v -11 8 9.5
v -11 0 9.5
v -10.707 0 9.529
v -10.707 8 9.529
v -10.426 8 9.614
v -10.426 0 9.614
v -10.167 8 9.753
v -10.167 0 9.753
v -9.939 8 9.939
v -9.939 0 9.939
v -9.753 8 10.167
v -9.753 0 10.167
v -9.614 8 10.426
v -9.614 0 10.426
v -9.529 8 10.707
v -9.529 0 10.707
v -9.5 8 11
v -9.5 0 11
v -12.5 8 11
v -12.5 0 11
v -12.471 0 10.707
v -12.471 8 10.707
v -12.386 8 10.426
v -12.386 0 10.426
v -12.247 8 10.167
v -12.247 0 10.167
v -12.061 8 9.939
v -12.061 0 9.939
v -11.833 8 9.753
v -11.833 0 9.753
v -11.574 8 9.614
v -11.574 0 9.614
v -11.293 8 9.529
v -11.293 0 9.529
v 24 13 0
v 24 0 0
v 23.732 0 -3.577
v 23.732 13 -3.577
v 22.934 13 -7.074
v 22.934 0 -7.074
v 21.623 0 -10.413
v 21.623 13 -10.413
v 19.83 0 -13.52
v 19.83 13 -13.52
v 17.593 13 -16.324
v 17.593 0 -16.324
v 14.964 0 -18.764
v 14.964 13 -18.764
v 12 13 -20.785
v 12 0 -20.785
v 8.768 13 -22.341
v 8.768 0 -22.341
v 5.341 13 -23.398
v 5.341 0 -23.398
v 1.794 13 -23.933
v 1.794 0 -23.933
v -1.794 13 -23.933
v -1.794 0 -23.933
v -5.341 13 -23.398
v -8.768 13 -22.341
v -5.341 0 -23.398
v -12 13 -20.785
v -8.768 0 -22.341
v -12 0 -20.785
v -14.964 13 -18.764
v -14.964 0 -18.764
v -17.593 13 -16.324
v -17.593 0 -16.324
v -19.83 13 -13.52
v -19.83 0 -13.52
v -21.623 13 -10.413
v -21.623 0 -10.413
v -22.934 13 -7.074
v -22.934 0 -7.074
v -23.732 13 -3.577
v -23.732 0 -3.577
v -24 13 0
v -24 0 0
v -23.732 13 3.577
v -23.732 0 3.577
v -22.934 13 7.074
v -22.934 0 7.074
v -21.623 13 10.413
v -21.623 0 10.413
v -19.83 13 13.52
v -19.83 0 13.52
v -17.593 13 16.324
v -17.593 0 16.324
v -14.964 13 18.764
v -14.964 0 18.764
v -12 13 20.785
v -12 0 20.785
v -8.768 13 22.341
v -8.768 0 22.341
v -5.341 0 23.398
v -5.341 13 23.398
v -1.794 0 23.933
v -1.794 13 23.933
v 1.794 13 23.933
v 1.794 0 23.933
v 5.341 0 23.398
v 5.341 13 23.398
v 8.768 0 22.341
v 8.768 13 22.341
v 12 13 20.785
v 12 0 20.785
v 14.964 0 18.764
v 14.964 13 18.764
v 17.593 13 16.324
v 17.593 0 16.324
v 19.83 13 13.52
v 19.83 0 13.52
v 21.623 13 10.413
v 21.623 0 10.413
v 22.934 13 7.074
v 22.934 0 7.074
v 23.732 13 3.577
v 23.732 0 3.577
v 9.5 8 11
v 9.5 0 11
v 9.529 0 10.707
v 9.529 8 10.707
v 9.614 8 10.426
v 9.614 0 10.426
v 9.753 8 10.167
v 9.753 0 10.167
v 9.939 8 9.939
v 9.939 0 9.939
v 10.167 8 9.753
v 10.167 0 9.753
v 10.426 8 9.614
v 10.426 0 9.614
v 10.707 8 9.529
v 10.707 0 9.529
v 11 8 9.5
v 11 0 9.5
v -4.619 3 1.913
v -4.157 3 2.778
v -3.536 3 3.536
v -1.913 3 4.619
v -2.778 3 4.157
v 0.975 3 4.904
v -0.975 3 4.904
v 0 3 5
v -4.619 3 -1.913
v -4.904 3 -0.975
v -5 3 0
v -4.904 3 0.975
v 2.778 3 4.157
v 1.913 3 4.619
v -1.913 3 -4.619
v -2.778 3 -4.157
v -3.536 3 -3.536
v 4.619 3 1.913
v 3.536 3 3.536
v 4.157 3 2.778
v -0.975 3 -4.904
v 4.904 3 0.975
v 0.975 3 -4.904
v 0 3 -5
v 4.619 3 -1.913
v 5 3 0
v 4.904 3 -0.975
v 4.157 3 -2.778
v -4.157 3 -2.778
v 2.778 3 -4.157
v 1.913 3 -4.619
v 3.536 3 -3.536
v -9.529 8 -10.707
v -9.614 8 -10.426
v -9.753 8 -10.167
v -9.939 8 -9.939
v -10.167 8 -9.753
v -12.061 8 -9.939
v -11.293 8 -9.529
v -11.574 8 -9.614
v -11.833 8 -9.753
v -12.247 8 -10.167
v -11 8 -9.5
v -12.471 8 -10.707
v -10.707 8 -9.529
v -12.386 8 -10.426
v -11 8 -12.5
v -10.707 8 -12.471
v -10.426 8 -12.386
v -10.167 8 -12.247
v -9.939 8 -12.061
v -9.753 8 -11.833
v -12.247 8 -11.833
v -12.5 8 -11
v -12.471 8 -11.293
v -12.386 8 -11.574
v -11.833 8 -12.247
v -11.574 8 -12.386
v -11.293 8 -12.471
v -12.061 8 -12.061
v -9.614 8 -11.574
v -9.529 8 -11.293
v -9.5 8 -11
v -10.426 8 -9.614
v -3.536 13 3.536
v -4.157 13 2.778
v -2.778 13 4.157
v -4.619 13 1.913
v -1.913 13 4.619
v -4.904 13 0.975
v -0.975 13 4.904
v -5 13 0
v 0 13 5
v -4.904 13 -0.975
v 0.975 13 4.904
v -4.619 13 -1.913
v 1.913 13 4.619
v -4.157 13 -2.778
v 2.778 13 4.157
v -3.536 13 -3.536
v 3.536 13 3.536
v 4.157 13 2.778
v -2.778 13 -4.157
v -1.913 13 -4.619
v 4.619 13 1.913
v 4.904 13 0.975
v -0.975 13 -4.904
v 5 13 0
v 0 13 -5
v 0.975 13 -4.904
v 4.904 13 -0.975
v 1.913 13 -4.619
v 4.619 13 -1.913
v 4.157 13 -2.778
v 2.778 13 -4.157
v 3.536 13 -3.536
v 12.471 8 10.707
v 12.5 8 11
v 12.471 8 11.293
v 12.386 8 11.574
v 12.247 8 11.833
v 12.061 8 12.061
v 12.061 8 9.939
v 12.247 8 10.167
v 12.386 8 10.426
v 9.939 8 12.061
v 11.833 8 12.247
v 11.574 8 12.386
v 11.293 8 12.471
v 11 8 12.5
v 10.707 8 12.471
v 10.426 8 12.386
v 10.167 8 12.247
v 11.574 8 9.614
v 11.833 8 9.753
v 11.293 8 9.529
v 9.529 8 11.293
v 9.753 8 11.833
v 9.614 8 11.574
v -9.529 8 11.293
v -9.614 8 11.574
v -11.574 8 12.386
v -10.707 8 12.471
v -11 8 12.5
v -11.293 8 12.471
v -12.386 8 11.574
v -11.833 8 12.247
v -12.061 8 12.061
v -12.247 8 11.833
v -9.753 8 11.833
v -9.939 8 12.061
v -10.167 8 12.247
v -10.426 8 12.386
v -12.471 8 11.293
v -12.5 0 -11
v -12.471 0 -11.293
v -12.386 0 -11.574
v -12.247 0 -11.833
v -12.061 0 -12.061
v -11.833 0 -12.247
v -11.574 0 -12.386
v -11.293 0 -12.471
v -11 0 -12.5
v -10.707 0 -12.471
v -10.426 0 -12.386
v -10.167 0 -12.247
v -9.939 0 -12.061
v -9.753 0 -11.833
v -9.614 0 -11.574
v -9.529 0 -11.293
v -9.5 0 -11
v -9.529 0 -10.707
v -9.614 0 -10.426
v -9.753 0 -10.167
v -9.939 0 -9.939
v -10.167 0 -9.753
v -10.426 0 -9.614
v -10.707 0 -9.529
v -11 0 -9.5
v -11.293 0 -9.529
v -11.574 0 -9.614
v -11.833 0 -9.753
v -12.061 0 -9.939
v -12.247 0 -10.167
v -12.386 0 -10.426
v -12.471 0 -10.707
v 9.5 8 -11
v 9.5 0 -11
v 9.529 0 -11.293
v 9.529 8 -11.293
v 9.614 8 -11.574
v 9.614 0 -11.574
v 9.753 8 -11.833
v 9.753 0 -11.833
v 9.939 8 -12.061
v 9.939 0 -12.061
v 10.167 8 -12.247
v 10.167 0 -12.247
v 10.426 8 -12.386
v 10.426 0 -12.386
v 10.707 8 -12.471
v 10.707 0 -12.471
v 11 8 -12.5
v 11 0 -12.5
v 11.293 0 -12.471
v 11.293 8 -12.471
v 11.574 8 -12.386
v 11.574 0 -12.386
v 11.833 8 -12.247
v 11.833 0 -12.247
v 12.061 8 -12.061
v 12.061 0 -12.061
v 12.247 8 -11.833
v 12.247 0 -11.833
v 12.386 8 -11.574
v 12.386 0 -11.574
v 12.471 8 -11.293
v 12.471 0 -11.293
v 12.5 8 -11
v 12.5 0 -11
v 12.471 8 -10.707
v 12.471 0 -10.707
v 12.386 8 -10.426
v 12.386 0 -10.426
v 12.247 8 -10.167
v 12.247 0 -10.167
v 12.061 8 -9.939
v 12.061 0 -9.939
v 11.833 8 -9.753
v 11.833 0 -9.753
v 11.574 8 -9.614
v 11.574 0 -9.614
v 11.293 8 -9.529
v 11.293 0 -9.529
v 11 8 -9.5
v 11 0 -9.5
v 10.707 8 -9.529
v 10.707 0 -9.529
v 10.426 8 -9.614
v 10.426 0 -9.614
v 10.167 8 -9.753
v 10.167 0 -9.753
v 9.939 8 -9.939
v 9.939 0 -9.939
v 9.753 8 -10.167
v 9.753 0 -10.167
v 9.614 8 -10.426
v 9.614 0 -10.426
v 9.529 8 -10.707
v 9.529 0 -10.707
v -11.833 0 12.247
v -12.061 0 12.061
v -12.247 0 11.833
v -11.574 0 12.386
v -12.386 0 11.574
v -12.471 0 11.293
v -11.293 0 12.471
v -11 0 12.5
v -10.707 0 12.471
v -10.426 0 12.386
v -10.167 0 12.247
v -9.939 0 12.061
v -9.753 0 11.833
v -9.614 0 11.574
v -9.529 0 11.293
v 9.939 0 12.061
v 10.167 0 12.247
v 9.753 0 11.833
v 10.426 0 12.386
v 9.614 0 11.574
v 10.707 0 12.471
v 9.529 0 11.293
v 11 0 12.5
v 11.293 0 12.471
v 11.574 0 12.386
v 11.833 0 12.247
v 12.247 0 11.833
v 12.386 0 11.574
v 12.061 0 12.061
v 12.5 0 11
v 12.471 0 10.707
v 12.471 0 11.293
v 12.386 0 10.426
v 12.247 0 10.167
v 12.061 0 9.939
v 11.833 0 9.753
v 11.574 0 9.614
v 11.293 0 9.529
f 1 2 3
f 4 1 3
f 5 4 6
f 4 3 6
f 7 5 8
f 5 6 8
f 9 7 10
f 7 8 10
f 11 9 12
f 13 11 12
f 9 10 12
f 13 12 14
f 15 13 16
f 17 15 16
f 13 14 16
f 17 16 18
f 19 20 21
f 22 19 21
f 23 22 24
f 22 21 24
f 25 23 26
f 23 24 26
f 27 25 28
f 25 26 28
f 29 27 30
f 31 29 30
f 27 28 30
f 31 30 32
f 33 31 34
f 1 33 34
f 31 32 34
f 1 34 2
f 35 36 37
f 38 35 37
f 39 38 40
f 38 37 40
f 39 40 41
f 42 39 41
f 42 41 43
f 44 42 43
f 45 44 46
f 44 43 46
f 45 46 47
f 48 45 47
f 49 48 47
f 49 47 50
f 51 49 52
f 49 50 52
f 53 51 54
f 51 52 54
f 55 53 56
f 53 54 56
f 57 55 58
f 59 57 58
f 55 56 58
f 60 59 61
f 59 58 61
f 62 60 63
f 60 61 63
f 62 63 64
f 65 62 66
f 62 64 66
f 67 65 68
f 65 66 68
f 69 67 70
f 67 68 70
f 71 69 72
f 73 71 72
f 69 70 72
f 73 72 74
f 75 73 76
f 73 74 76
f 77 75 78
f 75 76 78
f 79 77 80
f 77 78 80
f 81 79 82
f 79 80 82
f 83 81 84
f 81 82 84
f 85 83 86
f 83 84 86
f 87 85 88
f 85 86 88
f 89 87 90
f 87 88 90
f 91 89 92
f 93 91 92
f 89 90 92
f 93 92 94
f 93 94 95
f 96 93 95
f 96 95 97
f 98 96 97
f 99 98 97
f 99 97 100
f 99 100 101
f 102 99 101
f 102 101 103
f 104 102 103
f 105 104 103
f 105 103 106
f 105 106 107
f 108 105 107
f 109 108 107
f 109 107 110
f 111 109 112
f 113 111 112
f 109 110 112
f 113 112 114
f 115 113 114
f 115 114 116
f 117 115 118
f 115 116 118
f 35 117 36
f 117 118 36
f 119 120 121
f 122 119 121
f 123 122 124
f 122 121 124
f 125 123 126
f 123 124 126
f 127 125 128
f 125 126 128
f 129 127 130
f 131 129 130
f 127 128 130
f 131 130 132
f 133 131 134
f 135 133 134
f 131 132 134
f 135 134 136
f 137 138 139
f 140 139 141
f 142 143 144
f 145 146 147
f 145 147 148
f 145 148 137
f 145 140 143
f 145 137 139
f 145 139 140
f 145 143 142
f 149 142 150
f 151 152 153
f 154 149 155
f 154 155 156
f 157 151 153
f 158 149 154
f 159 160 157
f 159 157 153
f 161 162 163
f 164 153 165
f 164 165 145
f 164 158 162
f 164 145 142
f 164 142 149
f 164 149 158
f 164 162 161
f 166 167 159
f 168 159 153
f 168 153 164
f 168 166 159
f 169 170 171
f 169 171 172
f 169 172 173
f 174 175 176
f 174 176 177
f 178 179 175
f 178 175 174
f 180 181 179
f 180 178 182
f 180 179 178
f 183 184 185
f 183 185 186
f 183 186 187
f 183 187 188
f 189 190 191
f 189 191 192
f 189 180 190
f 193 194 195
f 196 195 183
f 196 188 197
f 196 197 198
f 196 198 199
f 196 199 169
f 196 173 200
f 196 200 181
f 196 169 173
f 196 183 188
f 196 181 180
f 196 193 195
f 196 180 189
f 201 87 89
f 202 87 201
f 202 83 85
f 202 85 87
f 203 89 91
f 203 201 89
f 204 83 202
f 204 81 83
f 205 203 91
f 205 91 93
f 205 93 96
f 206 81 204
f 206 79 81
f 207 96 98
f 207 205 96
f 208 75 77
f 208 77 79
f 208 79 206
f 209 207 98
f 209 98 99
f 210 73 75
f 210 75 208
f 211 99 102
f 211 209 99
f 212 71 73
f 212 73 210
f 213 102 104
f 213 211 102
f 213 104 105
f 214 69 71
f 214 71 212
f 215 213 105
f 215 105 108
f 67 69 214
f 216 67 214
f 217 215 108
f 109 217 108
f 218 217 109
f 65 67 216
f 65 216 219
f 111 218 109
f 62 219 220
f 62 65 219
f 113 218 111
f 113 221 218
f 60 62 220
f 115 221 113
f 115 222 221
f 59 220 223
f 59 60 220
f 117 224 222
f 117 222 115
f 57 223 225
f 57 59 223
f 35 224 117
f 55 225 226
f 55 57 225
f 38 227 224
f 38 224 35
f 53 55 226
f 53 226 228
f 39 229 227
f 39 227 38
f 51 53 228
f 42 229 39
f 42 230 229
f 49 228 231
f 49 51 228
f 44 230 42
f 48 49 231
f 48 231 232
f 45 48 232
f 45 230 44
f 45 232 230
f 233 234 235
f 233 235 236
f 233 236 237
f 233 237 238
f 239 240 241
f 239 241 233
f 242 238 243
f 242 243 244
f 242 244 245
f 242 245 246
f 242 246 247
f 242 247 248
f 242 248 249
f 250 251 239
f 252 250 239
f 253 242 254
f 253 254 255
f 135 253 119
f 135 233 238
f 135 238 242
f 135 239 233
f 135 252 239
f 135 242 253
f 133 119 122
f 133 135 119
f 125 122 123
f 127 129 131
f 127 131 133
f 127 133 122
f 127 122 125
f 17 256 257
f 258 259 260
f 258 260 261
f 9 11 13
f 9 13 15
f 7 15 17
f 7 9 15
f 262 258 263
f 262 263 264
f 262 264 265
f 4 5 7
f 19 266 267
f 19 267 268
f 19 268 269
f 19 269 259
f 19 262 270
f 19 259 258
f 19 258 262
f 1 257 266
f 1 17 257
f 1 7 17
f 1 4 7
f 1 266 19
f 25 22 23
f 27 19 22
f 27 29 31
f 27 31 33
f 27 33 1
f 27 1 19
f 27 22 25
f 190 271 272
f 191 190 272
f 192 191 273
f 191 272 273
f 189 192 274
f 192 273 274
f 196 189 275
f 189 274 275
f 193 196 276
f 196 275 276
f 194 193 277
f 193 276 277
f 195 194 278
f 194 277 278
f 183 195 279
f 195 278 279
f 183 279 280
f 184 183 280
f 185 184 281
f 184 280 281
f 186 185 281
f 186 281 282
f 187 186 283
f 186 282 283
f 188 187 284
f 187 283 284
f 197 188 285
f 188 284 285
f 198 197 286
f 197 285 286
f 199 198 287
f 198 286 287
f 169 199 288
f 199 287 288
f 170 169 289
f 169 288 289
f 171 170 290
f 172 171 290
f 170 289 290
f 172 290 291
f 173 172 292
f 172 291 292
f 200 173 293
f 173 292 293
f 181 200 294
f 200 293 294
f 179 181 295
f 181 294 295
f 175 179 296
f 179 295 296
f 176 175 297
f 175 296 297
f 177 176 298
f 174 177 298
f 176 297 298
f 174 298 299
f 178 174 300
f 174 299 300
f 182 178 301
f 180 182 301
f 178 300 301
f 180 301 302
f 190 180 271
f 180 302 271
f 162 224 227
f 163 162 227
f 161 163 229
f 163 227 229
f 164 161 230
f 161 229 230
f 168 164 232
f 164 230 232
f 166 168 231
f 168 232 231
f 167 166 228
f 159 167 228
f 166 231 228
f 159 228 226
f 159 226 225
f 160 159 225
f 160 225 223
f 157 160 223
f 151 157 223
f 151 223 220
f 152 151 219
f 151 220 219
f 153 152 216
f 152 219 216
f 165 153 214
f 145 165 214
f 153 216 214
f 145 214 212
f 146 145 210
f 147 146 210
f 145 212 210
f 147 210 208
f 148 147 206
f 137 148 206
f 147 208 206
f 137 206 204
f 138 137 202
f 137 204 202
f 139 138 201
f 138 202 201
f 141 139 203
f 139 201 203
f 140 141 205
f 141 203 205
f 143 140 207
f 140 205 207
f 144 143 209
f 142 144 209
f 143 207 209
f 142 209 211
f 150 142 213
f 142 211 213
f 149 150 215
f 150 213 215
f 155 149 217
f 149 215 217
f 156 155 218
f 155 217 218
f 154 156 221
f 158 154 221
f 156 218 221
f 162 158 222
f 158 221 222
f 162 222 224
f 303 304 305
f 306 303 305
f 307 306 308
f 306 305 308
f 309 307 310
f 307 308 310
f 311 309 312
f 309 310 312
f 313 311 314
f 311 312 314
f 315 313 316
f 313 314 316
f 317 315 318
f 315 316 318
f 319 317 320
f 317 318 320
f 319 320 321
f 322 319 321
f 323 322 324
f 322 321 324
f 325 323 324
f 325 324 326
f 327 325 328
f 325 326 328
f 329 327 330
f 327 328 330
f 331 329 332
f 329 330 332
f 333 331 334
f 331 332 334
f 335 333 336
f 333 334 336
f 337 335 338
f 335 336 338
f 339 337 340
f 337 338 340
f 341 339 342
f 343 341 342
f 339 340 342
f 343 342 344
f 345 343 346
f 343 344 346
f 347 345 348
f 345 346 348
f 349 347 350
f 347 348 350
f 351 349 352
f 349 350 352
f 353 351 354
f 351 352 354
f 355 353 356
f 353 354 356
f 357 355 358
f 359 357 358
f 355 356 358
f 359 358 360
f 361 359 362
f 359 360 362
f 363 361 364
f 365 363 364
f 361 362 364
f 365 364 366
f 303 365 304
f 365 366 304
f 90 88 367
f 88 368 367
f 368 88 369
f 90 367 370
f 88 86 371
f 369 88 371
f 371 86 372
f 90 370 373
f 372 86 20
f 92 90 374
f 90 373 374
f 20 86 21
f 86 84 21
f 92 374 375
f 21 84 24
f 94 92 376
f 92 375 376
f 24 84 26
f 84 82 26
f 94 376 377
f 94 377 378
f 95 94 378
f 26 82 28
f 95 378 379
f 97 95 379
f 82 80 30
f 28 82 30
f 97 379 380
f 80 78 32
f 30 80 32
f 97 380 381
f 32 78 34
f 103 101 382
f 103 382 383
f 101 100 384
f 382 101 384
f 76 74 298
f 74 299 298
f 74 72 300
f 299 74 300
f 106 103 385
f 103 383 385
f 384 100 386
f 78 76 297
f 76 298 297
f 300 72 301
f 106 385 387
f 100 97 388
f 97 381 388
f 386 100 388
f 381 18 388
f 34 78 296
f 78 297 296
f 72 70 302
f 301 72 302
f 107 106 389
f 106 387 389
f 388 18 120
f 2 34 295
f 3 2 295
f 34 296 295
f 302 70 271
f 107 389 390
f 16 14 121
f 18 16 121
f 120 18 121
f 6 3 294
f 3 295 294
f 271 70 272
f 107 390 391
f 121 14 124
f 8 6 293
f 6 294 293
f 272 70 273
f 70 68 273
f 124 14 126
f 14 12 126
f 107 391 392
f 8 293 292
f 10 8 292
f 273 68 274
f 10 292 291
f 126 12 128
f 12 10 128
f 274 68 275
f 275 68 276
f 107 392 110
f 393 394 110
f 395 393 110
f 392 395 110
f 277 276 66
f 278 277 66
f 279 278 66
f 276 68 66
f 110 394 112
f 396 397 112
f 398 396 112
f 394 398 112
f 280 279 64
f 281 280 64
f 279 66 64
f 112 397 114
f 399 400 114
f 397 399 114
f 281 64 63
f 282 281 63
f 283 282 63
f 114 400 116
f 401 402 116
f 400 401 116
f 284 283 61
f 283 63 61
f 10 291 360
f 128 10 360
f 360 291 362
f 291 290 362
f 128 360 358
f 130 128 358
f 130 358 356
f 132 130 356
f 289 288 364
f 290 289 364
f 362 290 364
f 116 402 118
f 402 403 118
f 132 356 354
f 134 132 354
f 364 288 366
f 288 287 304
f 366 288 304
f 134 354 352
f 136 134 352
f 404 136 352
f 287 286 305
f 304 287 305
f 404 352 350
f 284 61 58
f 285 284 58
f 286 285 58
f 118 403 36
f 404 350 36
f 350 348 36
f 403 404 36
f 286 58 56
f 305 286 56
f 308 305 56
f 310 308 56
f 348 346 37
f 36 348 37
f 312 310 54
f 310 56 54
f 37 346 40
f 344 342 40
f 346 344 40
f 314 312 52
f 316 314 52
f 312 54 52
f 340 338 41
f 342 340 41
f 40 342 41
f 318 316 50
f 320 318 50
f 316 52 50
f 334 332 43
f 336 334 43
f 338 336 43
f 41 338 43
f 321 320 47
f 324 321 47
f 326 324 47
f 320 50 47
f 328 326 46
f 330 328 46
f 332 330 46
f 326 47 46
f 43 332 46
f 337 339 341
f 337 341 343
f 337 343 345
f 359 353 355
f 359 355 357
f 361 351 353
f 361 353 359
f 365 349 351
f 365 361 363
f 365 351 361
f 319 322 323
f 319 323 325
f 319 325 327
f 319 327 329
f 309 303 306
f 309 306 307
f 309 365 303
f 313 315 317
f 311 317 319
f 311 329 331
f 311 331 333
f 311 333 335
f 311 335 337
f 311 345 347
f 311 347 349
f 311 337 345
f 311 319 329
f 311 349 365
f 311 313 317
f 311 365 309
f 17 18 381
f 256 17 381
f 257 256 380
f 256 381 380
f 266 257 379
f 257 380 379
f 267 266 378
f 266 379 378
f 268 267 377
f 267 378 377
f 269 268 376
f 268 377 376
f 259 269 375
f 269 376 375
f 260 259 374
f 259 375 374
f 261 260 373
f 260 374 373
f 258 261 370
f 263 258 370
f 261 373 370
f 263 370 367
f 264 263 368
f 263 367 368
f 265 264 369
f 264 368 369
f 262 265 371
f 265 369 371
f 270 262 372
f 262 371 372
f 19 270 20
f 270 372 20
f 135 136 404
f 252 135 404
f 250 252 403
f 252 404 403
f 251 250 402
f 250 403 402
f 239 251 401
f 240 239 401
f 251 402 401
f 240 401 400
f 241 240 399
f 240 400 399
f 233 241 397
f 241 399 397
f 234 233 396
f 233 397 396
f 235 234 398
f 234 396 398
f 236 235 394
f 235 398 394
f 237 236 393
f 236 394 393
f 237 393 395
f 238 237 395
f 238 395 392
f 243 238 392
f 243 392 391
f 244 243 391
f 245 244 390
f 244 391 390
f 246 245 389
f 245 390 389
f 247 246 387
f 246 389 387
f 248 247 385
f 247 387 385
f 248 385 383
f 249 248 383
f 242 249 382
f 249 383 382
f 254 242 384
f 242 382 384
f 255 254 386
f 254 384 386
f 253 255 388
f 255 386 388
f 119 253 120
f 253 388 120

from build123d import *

# Parameters (mm, degrees)
SKETCH1_R           = 24
BOSS_EXTRUDE1_DEPTH = 13
SKETCH2_R           = 5
CUT_EXTRUDE1_DEPTH  = 10
SKETCH3_R           = 1.5
CUT_EXTRUDE2_DEPTH  = 8


with BuildPart() as part:
    # Sketch1 → Boss-Extrude1 (new body)
    with BuildSketch(Plane(origin=(0, 0, 0), x_dir=(1, 0, 0), z_dir=(0, 1, 0))):
        Circle(SKETCH1_R)
    extrude(amount=BOSS_EXTRUDE1_DEPTH)

    # Sketch2 → Cut-Extrude1 (cut)
    with BuildSketch(Plane(origin=(0, 13, 0), x_dir=(1, 0, 0), z_dir=(0, 1, 0))):
        Circle(SKETCH2_R)
    extrude(amount=-CUT_EXTRUDE1_DEPTH, mode=Mode.SUBTRACT)

    # Sketch3 → Cut-Extrude2 (cut)
    with BuildSketch(Plane(origin=(0, 0, 0), x_dir=(-1, 0, 0), z_dir=(0, -1, 0))):
        with BuildLine():
            ThreePointArc((11, -9.5), (9.939339828, -9.939339828), (9.5, -11))
            Line((9.5, -11), (11, -11))
            Line((11, -11), (11, -9.5))
        make_face()
        with BuildLine():
            Line((11, -11), (9.5, -11))
            ThreePointArc((9.5, -11), (11, -12.5), (12.5, -11))
            ThreePointArc((12.5, -11), (12.060660172, -9.939339828), (11, -9.5))
            Line((11, -9.5), (11, -11))
        make_face()
        with BuildLine():
            ThreePointArc((-11, -9.5), (-12.060660172, -12.060660172), (-9.5, -11))
            Line((-9.5, -11), (-11, -11))
            Line((-11, -11), (-11, -9.5))
        make_face()
        with BuildLine():
            Line((-11, -11), (-9.5, -11))
            ThreePointArc((-9.5, -11), (-9.939339828, -9.939339828), (-11, -9.5))
            Line((-11, -9.5), (-11, -11))
        make_face()
        with Locations((11, 11)):
            Circle(SKETCH3_R)
        with Locations((-11, 11)):
            Circle(SKETCH3_R)
    extrude(amount=-CUT_EXTRUDE2_DEPTH, mode=Mode.SUBTRACT)


solid = part.part
